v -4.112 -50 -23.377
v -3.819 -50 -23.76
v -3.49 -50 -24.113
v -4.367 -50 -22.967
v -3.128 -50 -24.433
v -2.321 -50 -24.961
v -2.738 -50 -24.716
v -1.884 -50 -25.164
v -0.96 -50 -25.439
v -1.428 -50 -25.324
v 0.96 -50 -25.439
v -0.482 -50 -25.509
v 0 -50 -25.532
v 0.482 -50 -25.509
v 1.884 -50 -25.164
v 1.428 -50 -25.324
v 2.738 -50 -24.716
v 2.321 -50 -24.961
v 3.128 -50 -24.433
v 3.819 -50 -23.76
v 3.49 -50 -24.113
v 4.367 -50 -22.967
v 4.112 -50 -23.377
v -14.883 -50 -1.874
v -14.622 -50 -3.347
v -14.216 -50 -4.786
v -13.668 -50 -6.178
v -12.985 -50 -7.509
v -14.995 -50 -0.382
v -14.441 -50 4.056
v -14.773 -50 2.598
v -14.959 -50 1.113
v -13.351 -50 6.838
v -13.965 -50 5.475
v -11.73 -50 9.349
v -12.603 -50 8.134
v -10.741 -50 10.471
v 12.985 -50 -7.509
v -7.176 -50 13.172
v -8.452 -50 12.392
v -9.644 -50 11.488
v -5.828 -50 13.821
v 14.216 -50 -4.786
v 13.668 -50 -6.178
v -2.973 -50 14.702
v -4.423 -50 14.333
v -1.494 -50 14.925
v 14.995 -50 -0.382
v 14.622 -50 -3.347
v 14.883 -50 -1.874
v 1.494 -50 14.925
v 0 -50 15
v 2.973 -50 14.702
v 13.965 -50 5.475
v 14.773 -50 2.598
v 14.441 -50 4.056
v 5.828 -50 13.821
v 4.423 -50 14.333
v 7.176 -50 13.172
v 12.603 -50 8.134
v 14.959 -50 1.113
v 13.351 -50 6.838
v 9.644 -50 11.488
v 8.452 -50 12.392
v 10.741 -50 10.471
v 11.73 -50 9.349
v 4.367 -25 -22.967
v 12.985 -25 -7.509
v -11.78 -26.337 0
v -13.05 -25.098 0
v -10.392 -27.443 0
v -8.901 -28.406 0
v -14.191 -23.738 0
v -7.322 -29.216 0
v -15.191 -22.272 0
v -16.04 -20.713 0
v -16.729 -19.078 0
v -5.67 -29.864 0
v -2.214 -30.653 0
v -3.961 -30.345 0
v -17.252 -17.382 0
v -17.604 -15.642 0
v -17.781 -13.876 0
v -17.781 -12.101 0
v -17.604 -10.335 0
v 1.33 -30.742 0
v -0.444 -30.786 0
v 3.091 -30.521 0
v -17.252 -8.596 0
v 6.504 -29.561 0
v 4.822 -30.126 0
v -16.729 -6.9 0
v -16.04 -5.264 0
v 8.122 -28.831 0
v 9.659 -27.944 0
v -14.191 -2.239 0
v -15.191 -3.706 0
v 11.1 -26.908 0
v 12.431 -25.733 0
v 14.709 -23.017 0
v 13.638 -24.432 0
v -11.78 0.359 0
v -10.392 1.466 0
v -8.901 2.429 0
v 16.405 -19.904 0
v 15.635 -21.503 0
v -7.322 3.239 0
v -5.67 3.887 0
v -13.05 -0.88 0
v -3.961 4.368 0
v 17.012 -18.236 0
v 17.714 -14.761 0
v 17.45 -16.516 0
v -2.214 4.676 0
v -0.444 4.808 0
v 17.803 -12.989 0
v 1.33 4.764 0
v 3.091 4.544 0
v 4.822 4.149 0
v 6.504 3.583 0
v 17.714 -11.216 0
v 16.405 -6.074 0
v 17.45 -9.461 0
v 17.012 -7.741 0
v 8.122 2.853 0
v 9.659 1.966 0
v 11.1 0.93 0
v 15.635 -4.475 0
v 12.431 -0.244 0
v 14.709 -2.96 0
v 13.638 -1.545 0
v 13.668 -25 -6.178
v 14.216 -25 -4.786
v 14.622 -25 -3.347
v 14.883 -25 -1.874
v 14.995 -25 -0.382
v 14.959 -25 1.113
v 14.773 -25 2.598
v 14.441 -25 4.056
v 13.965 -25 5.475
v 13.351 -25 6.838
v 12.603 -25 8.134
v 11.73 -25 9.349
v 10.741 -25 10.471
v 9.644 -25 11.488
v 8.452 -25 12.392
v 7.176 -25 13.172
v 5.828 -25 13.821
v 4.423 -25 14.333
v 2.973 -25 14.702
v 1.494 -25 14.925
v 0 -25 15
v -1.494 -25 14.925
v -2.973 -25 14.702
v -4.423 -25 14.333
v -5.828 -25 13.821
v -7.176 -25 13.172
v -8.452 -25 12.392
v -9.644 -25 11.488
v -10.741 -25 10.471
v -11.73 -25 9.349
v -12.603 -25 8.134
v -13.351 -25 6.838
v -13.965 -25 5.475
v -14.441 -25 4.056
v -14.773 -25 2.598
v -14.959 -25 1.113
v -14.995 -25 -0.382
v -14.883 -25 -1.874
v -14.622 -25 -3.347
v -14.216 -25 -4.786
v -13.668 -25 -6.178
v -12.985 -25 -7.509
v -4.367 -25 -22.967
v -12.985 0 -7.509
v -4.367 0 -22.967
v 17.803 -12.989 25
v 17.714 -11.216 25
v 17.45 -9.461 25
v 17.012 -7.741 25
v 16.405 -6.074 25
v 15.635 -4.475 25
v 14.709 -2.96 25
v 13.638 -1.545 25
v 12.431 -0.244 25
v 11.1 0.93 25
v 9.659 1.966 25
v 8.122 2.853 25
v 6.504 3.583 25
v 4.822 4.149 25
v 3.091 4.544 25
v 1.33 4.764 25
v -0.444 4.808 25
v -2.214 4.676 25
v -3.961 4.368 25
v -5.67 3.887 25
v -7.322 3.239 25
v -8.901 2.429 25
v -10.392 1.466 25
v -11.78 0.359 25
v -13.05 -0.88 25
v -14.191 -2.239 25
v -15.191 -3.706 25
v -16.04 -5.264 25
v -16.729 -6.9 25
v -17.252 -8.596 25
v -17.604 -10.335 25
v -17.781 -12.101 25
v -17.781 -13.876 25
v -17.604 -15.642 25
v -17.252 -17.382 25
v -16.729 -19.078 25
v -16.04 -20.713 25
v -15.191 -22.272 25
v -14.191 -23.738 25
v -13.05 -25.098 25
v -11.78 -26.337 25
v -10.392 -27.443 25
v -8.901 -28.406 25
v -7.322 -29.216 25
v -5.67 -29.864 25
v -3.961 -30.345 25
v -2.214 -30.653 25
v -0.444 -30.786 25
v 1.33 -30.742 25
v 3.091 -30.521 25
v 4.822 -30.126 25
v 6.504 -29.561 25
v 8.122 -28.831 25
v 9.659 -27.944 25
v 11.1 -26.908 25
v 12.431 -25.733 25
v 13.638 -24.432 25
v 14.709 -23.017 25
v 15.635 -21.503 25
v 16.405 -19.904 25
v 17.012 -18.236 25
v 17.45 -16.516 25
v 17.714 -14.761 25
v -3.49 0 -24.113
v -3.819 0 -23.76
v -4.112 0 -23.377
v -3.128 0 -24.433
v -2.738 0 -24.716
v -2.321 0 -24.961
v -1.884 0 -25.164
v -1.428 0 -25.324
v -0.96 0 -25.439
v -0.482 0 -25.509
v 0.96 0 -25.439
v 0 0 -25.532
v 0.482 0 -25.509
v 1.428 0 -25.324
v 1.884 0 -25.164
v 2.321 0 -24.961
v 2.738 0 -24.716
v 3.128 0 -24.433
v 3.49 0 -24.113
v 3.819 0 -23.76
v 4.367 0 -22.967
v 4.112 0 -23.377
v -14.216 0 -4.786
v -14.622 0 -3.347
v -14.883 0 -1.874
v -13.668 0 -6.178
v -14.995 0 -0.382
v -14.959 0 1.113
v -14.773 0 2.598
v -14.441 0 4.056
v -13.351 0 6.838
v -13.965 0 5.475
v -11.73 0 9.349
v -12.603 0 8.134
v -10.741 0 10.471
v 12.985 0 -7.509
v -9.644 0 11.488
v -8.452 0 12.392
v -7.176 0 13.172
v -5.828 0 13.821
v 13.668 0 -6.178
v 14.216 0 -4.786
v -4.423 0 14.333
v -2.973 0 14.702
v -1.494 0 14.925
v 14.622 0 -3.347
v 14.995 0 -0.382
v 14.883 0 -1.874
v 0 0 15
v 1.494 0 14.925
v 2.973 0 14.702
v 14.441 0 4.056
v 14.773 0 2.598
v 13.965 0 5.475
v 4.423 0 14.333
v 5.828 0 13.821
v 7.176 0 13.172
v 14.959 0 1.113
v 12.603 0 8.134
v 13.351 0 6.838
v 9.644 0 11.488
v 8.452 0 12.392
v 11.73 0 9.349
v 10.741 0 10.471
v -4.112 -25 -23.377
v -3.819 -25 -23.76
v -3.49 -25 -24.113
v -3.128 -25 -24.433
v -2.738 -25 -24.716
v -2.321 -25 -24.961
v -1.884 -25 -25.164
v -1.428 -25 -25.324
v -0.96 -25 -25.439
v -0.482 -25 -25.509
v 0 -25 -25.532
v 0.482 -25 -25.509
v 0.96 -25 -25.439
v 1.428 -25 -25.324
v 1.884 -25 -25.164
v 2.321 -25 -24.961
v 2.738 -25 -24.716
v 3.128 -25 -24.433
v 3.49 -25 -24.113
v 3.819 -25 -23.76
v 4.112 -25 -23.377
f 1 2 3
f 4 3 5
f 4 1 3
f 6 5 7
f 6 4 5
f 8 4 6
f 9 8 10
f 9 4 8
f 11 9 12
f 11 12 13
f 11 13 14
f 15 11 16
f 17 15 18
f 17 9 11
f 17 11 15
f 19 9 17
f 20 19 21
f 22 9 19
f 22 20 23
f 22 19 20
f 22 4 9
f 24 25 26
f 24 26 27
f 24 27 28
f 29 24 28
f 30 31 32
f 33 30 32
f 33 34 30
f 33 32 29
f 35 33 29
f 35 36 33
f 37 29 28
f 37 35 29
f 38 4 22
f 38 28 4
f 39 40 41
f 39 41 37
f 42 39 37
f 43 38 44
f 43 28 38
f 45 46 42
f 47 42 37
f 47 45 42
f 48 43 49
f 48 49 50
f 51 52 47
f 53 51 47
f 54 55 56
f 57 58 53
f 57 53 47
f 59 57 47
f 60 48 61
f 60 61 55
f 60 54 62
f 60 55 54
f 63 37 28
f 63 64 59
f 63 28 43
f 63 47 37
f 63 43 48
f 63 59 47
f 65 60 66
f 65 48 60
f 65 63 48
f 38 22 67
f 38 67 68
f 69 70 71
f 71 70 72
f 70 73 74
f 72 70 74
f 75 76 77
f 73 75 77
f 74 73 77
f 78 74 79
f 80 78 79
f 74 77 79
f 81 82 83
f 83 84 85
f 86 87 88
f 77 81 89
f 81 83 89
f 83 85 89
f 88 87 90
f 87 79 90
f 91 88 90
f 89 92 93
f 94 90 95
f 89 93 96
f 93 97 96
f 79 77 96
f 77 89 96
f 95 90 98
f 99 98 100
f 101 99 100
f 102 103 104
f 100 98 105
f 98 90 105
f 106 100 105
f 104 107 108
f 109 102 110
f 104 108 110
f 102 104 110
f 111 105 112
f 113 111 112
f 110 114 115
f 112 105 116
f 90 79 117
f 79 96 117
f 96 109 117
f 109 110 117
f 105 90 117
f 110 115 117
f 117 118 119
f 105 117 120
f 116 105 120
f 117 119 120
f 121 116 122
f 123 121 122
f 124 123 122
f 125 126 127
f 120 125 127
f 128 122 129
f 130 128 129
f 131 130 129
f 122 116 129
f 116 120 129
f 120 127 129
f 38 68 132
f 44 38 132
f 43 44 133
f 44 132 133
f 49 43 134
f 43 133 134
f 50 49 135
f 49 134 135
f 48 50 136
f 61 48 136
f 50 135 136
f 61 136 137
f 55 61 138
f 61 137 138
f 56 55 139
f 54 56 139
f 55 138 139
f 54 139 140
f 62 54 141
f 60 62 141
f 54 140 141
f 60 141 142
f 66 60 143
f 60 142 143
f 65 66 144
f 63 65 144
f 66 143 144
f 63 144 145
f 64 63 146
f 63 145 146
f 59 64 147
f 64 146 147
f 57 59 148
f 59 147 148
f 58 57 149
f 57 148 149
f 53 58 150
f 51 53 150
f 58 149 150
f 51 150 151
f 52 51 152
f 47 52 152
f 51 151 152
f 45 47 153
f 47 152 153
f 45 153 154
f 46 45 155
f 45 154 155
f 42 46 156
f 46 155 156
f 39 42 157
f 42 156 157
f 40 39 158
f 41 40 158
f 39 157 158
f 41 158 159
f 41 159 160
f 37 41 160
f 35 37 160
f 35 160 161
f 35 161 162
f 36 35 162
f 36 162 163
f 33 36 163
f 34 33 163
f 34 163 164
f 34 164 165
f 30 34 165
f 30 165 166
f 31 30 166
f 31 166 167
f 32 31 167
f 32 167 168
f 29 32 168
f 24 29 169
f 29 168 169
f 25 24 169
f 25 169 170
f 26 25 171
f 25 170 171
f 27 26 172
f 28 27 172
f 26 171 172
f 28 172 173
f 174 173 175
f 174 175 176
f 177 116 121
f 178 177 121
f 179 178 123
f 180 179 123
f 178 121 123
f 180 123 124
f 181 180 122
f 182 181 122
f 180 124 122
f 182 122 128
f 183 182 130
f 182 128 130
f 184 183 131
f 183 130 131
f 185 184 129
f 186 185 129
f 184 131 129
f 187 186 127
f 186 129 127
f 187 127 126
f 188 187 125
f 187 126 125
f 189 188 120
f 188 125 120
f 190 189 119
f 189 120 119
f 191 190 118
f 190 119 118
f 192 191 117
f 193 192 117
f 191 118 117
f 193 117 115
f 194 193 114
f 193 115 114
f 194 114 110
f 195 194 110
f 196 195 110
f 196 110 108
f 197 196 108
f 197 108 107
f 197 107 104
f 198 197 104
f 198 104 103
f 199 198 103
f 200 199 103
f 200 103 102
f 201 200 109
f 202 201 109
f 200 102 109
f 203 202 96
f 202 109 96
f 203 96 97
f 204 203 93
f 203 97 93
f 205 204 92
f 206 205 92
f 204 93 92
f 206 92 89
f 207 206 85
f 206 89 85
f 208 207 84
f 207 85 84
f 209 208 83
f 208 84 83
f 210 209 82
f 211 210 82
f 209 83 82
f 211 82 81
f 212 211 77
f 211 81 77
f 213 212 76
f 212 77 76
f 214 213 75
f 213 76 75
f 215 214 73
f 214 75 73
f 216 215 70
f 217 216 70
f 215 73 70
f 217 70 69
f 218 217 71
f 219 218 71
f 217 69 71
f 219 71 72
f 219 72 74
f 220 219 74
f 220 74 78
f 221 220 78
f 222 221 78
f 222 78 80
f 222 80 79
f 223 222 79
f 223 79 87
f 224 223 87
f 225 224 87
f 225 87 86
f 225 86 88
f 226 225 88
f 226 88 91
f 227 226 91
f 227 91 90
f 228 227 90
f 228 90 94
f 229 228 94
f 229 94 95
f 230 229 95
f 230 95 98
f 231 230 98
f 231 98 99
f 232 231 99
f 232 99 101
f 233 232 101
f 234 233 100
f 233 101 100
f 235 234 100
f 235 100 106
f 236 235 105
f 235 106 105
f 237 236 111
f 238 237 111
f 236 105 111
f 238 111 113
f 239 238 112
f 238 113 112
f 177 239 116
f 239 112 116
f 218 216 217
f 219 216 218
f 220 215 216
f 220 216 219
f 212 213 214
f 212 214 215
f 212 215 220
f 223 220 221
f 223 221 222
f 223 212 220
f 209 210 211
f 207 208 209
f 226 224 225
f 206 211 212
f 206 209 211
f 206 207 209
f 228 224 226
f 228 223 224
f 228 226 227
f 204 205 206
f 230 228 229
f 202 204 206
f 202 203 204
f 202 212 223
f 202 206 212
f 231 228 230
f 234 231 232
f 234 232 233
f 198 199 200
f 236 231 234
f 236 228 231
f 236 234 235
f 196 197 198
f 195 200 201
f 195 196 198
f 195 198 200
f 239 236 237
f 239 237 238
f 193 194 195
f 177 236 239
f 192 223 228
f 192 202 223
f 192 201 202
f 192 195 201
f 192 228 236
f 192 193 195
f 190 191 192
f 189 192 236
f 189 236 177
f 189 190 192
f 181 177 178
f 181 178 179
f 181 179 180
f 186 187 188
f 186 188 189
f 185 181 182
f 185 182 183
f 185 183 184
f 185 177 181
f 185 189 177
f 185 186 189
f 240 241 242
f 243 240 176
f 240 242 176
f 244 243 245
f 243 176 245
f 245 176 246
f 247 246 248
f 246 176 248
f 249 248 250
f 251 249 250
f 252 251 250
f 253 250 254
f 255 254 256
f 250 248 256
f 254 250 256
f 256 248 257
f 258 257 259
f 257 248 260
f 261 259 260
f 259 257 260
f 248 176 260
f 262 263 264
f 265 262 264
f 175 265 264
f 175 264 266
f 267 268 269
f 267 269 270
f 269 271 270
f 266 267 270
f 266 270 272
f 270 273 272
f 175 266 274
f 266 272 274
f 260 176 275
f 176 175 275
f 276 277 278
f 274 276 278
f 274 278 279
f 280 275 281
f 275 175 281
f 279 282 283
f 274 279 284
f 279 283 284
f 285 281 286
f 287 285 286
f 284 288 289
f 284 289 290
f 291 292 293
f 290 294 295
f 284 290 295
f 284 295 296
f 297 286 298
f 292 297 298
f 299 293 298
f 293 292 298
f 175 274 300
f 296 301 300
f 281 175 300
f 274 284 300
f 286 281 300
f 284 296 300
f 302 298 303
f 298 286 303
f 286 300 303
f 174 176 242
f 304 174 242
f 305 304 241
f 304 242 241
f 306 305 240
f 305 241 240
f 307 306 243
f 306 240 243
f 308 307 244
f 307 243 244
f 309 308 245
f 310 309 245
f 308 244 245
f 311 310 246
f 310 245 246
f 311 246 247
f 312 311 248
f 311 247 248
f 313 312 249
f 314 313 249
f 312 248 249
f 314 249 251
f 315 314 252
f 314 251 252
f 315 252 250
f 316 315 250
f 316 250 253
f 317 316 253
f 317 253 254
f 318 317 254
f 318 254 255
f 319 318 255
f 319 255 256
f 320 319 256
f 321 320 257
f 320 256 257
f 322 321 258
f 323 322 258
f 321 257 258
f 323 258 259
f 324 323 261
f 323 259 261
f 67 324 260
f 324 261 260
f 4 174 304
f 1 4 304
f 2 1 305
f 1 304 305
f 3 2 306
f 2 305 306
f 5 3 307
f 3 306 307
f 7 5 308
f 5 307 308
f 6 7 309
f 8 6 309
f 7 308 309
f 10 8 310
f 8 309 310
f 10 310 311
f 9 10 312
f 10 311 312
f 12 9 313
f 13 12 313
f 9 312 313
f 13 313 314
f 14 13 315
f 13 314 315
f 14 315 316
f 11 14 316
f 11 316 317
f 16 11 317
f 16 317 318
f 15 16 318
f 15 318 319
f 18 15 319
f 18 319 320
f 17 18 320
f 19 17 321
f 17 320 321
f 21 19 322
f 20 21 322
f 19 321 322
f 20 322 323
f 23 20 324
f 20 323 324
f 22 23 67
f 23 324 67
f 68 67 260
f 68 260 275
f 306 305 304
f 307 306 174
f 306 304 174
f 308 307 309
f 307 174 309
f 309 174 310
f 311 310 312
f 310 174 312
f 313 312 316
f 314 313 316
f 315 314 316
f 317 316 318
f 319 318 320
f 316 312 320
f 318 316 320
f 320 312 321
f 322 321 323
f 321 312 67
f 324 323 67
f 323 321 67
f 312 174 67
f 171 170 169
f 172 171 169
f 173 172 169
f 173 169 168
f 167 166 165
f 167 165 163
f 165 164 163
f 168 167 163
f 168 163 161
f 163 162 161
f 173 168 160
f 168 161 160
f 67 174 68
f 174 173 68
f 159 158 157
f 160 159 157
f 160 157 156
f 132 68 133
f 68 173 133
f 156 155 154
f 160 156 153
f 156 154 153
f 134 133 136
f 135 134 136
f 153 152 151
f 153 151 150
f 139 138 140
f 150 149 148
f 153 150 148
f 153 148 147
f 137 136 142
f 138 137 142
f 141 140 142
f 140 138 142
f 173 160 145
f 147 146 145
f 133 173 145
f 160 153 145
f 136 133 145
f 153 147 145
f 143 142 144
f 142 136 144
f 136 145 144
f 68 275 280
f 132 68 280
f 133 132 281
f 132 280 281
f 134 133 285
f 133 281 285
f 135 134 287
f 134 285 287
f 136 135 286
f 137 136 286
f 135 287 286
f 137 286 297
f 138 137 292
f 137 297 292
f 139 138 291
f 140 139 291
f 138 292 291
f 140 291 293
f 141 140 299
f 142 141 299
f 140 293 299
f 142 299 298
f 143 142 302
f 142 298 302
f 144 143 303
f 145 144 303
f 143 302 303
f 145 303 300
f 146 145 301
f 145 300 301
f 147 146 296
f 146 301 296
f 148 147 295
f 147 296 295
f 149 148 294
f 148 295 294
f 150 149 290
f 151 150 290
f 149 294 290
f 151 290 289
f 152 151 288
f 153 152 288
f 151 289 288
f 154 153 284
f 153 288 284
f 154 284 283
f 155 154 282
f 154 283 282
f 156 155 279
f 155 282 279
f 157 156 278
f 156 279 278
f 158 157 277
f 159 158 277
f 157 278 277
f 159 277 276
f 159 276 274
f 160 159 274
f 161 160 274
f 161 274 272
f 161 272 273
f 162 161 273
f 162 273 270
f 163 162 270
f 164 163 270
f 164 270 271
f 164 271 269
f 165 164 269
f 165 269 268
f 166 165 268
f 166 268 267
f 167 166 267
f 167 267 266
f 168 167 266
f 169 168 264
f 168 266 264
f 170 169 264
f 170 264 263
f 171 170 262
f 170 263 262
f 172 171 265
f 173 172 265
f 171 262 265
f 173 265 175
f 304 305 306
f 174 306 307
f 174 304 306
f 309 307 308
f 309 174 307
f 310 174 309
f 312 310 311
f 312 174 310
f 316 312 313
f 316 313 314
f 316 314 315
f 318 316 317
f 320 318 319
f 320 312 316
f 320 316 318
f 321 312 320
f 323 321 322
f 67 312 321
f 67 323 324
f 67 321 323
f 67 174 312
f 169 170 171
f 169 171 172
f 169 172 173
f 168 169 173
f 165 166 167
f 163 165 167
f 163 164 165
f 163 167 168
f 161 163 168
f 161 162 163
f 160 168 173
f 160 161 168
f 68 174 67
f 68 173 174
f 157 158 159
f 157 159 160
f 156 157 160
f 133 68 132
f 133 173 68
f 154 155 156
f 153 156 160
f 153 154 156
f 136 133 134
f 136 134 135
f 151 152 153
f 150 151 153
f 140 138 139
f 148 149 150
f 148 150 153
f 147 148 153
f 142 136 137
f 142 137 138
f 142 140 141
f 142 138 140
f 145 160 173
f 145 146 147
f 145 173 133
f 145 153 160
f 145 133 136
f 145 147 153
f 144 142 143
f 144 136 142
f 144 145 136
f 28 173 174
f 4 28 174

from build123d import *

# Parameters (mm, degrees)
F1_DEPTH = 25
F2_R     = 17.802767
F3_DEPTH = 25
F5_DEPTH = 25


with BuildPart() as f1:
    # F0 (on Front) → F1 (new body)
    with BuildSketch(Plane.XZ):
        with BuildLine():
            Line((4.367155, -22.967014), (12.98513, -7.509087))
            ThreePointArc((12.98513, -7.509087), (0, 15), (-12.98513, -7.509087))
            Line((-12.98513, -7.509087), (-4.367155, -22.967014))
            ThreePointArc((-4.367155, -22.967014), (0, -25.532274), (4.367155, -22.967014))
        make_face()
    extrude(amount=F1_DEPTH)


with BuildPart() as f3:
    # F2 (on Top) → F3 (new body)
    with BuildSketch(Plane.XY):
        with Locations((0, -12.988755)):
            Circle(F2_R)
    extrude(amount=F3_DEPTH)


with BuildPart() as f5:
    # F4 (on face) → F5 (new body)
    with BuildSketch(Plane.XZ.offset(25)):
        with BuildLine():
            Line((4.367155, -22.967014), (12.98513, -7.509087))
            ThreePointArc((12.98513, -7.509087), (0, 15), (-12.98513, -7.509087))
            Line((-12.98513, -7.509087), (-4.367155, -22.967014))
            ThreePointArc((-4.367155, -22.967014), (0, -25.532274), (4.367155, -22.967014))
        make_face()
    extrude(amount=F5_DEPTH)


solid = Compound([f1.part, f3.part, f5.part])
